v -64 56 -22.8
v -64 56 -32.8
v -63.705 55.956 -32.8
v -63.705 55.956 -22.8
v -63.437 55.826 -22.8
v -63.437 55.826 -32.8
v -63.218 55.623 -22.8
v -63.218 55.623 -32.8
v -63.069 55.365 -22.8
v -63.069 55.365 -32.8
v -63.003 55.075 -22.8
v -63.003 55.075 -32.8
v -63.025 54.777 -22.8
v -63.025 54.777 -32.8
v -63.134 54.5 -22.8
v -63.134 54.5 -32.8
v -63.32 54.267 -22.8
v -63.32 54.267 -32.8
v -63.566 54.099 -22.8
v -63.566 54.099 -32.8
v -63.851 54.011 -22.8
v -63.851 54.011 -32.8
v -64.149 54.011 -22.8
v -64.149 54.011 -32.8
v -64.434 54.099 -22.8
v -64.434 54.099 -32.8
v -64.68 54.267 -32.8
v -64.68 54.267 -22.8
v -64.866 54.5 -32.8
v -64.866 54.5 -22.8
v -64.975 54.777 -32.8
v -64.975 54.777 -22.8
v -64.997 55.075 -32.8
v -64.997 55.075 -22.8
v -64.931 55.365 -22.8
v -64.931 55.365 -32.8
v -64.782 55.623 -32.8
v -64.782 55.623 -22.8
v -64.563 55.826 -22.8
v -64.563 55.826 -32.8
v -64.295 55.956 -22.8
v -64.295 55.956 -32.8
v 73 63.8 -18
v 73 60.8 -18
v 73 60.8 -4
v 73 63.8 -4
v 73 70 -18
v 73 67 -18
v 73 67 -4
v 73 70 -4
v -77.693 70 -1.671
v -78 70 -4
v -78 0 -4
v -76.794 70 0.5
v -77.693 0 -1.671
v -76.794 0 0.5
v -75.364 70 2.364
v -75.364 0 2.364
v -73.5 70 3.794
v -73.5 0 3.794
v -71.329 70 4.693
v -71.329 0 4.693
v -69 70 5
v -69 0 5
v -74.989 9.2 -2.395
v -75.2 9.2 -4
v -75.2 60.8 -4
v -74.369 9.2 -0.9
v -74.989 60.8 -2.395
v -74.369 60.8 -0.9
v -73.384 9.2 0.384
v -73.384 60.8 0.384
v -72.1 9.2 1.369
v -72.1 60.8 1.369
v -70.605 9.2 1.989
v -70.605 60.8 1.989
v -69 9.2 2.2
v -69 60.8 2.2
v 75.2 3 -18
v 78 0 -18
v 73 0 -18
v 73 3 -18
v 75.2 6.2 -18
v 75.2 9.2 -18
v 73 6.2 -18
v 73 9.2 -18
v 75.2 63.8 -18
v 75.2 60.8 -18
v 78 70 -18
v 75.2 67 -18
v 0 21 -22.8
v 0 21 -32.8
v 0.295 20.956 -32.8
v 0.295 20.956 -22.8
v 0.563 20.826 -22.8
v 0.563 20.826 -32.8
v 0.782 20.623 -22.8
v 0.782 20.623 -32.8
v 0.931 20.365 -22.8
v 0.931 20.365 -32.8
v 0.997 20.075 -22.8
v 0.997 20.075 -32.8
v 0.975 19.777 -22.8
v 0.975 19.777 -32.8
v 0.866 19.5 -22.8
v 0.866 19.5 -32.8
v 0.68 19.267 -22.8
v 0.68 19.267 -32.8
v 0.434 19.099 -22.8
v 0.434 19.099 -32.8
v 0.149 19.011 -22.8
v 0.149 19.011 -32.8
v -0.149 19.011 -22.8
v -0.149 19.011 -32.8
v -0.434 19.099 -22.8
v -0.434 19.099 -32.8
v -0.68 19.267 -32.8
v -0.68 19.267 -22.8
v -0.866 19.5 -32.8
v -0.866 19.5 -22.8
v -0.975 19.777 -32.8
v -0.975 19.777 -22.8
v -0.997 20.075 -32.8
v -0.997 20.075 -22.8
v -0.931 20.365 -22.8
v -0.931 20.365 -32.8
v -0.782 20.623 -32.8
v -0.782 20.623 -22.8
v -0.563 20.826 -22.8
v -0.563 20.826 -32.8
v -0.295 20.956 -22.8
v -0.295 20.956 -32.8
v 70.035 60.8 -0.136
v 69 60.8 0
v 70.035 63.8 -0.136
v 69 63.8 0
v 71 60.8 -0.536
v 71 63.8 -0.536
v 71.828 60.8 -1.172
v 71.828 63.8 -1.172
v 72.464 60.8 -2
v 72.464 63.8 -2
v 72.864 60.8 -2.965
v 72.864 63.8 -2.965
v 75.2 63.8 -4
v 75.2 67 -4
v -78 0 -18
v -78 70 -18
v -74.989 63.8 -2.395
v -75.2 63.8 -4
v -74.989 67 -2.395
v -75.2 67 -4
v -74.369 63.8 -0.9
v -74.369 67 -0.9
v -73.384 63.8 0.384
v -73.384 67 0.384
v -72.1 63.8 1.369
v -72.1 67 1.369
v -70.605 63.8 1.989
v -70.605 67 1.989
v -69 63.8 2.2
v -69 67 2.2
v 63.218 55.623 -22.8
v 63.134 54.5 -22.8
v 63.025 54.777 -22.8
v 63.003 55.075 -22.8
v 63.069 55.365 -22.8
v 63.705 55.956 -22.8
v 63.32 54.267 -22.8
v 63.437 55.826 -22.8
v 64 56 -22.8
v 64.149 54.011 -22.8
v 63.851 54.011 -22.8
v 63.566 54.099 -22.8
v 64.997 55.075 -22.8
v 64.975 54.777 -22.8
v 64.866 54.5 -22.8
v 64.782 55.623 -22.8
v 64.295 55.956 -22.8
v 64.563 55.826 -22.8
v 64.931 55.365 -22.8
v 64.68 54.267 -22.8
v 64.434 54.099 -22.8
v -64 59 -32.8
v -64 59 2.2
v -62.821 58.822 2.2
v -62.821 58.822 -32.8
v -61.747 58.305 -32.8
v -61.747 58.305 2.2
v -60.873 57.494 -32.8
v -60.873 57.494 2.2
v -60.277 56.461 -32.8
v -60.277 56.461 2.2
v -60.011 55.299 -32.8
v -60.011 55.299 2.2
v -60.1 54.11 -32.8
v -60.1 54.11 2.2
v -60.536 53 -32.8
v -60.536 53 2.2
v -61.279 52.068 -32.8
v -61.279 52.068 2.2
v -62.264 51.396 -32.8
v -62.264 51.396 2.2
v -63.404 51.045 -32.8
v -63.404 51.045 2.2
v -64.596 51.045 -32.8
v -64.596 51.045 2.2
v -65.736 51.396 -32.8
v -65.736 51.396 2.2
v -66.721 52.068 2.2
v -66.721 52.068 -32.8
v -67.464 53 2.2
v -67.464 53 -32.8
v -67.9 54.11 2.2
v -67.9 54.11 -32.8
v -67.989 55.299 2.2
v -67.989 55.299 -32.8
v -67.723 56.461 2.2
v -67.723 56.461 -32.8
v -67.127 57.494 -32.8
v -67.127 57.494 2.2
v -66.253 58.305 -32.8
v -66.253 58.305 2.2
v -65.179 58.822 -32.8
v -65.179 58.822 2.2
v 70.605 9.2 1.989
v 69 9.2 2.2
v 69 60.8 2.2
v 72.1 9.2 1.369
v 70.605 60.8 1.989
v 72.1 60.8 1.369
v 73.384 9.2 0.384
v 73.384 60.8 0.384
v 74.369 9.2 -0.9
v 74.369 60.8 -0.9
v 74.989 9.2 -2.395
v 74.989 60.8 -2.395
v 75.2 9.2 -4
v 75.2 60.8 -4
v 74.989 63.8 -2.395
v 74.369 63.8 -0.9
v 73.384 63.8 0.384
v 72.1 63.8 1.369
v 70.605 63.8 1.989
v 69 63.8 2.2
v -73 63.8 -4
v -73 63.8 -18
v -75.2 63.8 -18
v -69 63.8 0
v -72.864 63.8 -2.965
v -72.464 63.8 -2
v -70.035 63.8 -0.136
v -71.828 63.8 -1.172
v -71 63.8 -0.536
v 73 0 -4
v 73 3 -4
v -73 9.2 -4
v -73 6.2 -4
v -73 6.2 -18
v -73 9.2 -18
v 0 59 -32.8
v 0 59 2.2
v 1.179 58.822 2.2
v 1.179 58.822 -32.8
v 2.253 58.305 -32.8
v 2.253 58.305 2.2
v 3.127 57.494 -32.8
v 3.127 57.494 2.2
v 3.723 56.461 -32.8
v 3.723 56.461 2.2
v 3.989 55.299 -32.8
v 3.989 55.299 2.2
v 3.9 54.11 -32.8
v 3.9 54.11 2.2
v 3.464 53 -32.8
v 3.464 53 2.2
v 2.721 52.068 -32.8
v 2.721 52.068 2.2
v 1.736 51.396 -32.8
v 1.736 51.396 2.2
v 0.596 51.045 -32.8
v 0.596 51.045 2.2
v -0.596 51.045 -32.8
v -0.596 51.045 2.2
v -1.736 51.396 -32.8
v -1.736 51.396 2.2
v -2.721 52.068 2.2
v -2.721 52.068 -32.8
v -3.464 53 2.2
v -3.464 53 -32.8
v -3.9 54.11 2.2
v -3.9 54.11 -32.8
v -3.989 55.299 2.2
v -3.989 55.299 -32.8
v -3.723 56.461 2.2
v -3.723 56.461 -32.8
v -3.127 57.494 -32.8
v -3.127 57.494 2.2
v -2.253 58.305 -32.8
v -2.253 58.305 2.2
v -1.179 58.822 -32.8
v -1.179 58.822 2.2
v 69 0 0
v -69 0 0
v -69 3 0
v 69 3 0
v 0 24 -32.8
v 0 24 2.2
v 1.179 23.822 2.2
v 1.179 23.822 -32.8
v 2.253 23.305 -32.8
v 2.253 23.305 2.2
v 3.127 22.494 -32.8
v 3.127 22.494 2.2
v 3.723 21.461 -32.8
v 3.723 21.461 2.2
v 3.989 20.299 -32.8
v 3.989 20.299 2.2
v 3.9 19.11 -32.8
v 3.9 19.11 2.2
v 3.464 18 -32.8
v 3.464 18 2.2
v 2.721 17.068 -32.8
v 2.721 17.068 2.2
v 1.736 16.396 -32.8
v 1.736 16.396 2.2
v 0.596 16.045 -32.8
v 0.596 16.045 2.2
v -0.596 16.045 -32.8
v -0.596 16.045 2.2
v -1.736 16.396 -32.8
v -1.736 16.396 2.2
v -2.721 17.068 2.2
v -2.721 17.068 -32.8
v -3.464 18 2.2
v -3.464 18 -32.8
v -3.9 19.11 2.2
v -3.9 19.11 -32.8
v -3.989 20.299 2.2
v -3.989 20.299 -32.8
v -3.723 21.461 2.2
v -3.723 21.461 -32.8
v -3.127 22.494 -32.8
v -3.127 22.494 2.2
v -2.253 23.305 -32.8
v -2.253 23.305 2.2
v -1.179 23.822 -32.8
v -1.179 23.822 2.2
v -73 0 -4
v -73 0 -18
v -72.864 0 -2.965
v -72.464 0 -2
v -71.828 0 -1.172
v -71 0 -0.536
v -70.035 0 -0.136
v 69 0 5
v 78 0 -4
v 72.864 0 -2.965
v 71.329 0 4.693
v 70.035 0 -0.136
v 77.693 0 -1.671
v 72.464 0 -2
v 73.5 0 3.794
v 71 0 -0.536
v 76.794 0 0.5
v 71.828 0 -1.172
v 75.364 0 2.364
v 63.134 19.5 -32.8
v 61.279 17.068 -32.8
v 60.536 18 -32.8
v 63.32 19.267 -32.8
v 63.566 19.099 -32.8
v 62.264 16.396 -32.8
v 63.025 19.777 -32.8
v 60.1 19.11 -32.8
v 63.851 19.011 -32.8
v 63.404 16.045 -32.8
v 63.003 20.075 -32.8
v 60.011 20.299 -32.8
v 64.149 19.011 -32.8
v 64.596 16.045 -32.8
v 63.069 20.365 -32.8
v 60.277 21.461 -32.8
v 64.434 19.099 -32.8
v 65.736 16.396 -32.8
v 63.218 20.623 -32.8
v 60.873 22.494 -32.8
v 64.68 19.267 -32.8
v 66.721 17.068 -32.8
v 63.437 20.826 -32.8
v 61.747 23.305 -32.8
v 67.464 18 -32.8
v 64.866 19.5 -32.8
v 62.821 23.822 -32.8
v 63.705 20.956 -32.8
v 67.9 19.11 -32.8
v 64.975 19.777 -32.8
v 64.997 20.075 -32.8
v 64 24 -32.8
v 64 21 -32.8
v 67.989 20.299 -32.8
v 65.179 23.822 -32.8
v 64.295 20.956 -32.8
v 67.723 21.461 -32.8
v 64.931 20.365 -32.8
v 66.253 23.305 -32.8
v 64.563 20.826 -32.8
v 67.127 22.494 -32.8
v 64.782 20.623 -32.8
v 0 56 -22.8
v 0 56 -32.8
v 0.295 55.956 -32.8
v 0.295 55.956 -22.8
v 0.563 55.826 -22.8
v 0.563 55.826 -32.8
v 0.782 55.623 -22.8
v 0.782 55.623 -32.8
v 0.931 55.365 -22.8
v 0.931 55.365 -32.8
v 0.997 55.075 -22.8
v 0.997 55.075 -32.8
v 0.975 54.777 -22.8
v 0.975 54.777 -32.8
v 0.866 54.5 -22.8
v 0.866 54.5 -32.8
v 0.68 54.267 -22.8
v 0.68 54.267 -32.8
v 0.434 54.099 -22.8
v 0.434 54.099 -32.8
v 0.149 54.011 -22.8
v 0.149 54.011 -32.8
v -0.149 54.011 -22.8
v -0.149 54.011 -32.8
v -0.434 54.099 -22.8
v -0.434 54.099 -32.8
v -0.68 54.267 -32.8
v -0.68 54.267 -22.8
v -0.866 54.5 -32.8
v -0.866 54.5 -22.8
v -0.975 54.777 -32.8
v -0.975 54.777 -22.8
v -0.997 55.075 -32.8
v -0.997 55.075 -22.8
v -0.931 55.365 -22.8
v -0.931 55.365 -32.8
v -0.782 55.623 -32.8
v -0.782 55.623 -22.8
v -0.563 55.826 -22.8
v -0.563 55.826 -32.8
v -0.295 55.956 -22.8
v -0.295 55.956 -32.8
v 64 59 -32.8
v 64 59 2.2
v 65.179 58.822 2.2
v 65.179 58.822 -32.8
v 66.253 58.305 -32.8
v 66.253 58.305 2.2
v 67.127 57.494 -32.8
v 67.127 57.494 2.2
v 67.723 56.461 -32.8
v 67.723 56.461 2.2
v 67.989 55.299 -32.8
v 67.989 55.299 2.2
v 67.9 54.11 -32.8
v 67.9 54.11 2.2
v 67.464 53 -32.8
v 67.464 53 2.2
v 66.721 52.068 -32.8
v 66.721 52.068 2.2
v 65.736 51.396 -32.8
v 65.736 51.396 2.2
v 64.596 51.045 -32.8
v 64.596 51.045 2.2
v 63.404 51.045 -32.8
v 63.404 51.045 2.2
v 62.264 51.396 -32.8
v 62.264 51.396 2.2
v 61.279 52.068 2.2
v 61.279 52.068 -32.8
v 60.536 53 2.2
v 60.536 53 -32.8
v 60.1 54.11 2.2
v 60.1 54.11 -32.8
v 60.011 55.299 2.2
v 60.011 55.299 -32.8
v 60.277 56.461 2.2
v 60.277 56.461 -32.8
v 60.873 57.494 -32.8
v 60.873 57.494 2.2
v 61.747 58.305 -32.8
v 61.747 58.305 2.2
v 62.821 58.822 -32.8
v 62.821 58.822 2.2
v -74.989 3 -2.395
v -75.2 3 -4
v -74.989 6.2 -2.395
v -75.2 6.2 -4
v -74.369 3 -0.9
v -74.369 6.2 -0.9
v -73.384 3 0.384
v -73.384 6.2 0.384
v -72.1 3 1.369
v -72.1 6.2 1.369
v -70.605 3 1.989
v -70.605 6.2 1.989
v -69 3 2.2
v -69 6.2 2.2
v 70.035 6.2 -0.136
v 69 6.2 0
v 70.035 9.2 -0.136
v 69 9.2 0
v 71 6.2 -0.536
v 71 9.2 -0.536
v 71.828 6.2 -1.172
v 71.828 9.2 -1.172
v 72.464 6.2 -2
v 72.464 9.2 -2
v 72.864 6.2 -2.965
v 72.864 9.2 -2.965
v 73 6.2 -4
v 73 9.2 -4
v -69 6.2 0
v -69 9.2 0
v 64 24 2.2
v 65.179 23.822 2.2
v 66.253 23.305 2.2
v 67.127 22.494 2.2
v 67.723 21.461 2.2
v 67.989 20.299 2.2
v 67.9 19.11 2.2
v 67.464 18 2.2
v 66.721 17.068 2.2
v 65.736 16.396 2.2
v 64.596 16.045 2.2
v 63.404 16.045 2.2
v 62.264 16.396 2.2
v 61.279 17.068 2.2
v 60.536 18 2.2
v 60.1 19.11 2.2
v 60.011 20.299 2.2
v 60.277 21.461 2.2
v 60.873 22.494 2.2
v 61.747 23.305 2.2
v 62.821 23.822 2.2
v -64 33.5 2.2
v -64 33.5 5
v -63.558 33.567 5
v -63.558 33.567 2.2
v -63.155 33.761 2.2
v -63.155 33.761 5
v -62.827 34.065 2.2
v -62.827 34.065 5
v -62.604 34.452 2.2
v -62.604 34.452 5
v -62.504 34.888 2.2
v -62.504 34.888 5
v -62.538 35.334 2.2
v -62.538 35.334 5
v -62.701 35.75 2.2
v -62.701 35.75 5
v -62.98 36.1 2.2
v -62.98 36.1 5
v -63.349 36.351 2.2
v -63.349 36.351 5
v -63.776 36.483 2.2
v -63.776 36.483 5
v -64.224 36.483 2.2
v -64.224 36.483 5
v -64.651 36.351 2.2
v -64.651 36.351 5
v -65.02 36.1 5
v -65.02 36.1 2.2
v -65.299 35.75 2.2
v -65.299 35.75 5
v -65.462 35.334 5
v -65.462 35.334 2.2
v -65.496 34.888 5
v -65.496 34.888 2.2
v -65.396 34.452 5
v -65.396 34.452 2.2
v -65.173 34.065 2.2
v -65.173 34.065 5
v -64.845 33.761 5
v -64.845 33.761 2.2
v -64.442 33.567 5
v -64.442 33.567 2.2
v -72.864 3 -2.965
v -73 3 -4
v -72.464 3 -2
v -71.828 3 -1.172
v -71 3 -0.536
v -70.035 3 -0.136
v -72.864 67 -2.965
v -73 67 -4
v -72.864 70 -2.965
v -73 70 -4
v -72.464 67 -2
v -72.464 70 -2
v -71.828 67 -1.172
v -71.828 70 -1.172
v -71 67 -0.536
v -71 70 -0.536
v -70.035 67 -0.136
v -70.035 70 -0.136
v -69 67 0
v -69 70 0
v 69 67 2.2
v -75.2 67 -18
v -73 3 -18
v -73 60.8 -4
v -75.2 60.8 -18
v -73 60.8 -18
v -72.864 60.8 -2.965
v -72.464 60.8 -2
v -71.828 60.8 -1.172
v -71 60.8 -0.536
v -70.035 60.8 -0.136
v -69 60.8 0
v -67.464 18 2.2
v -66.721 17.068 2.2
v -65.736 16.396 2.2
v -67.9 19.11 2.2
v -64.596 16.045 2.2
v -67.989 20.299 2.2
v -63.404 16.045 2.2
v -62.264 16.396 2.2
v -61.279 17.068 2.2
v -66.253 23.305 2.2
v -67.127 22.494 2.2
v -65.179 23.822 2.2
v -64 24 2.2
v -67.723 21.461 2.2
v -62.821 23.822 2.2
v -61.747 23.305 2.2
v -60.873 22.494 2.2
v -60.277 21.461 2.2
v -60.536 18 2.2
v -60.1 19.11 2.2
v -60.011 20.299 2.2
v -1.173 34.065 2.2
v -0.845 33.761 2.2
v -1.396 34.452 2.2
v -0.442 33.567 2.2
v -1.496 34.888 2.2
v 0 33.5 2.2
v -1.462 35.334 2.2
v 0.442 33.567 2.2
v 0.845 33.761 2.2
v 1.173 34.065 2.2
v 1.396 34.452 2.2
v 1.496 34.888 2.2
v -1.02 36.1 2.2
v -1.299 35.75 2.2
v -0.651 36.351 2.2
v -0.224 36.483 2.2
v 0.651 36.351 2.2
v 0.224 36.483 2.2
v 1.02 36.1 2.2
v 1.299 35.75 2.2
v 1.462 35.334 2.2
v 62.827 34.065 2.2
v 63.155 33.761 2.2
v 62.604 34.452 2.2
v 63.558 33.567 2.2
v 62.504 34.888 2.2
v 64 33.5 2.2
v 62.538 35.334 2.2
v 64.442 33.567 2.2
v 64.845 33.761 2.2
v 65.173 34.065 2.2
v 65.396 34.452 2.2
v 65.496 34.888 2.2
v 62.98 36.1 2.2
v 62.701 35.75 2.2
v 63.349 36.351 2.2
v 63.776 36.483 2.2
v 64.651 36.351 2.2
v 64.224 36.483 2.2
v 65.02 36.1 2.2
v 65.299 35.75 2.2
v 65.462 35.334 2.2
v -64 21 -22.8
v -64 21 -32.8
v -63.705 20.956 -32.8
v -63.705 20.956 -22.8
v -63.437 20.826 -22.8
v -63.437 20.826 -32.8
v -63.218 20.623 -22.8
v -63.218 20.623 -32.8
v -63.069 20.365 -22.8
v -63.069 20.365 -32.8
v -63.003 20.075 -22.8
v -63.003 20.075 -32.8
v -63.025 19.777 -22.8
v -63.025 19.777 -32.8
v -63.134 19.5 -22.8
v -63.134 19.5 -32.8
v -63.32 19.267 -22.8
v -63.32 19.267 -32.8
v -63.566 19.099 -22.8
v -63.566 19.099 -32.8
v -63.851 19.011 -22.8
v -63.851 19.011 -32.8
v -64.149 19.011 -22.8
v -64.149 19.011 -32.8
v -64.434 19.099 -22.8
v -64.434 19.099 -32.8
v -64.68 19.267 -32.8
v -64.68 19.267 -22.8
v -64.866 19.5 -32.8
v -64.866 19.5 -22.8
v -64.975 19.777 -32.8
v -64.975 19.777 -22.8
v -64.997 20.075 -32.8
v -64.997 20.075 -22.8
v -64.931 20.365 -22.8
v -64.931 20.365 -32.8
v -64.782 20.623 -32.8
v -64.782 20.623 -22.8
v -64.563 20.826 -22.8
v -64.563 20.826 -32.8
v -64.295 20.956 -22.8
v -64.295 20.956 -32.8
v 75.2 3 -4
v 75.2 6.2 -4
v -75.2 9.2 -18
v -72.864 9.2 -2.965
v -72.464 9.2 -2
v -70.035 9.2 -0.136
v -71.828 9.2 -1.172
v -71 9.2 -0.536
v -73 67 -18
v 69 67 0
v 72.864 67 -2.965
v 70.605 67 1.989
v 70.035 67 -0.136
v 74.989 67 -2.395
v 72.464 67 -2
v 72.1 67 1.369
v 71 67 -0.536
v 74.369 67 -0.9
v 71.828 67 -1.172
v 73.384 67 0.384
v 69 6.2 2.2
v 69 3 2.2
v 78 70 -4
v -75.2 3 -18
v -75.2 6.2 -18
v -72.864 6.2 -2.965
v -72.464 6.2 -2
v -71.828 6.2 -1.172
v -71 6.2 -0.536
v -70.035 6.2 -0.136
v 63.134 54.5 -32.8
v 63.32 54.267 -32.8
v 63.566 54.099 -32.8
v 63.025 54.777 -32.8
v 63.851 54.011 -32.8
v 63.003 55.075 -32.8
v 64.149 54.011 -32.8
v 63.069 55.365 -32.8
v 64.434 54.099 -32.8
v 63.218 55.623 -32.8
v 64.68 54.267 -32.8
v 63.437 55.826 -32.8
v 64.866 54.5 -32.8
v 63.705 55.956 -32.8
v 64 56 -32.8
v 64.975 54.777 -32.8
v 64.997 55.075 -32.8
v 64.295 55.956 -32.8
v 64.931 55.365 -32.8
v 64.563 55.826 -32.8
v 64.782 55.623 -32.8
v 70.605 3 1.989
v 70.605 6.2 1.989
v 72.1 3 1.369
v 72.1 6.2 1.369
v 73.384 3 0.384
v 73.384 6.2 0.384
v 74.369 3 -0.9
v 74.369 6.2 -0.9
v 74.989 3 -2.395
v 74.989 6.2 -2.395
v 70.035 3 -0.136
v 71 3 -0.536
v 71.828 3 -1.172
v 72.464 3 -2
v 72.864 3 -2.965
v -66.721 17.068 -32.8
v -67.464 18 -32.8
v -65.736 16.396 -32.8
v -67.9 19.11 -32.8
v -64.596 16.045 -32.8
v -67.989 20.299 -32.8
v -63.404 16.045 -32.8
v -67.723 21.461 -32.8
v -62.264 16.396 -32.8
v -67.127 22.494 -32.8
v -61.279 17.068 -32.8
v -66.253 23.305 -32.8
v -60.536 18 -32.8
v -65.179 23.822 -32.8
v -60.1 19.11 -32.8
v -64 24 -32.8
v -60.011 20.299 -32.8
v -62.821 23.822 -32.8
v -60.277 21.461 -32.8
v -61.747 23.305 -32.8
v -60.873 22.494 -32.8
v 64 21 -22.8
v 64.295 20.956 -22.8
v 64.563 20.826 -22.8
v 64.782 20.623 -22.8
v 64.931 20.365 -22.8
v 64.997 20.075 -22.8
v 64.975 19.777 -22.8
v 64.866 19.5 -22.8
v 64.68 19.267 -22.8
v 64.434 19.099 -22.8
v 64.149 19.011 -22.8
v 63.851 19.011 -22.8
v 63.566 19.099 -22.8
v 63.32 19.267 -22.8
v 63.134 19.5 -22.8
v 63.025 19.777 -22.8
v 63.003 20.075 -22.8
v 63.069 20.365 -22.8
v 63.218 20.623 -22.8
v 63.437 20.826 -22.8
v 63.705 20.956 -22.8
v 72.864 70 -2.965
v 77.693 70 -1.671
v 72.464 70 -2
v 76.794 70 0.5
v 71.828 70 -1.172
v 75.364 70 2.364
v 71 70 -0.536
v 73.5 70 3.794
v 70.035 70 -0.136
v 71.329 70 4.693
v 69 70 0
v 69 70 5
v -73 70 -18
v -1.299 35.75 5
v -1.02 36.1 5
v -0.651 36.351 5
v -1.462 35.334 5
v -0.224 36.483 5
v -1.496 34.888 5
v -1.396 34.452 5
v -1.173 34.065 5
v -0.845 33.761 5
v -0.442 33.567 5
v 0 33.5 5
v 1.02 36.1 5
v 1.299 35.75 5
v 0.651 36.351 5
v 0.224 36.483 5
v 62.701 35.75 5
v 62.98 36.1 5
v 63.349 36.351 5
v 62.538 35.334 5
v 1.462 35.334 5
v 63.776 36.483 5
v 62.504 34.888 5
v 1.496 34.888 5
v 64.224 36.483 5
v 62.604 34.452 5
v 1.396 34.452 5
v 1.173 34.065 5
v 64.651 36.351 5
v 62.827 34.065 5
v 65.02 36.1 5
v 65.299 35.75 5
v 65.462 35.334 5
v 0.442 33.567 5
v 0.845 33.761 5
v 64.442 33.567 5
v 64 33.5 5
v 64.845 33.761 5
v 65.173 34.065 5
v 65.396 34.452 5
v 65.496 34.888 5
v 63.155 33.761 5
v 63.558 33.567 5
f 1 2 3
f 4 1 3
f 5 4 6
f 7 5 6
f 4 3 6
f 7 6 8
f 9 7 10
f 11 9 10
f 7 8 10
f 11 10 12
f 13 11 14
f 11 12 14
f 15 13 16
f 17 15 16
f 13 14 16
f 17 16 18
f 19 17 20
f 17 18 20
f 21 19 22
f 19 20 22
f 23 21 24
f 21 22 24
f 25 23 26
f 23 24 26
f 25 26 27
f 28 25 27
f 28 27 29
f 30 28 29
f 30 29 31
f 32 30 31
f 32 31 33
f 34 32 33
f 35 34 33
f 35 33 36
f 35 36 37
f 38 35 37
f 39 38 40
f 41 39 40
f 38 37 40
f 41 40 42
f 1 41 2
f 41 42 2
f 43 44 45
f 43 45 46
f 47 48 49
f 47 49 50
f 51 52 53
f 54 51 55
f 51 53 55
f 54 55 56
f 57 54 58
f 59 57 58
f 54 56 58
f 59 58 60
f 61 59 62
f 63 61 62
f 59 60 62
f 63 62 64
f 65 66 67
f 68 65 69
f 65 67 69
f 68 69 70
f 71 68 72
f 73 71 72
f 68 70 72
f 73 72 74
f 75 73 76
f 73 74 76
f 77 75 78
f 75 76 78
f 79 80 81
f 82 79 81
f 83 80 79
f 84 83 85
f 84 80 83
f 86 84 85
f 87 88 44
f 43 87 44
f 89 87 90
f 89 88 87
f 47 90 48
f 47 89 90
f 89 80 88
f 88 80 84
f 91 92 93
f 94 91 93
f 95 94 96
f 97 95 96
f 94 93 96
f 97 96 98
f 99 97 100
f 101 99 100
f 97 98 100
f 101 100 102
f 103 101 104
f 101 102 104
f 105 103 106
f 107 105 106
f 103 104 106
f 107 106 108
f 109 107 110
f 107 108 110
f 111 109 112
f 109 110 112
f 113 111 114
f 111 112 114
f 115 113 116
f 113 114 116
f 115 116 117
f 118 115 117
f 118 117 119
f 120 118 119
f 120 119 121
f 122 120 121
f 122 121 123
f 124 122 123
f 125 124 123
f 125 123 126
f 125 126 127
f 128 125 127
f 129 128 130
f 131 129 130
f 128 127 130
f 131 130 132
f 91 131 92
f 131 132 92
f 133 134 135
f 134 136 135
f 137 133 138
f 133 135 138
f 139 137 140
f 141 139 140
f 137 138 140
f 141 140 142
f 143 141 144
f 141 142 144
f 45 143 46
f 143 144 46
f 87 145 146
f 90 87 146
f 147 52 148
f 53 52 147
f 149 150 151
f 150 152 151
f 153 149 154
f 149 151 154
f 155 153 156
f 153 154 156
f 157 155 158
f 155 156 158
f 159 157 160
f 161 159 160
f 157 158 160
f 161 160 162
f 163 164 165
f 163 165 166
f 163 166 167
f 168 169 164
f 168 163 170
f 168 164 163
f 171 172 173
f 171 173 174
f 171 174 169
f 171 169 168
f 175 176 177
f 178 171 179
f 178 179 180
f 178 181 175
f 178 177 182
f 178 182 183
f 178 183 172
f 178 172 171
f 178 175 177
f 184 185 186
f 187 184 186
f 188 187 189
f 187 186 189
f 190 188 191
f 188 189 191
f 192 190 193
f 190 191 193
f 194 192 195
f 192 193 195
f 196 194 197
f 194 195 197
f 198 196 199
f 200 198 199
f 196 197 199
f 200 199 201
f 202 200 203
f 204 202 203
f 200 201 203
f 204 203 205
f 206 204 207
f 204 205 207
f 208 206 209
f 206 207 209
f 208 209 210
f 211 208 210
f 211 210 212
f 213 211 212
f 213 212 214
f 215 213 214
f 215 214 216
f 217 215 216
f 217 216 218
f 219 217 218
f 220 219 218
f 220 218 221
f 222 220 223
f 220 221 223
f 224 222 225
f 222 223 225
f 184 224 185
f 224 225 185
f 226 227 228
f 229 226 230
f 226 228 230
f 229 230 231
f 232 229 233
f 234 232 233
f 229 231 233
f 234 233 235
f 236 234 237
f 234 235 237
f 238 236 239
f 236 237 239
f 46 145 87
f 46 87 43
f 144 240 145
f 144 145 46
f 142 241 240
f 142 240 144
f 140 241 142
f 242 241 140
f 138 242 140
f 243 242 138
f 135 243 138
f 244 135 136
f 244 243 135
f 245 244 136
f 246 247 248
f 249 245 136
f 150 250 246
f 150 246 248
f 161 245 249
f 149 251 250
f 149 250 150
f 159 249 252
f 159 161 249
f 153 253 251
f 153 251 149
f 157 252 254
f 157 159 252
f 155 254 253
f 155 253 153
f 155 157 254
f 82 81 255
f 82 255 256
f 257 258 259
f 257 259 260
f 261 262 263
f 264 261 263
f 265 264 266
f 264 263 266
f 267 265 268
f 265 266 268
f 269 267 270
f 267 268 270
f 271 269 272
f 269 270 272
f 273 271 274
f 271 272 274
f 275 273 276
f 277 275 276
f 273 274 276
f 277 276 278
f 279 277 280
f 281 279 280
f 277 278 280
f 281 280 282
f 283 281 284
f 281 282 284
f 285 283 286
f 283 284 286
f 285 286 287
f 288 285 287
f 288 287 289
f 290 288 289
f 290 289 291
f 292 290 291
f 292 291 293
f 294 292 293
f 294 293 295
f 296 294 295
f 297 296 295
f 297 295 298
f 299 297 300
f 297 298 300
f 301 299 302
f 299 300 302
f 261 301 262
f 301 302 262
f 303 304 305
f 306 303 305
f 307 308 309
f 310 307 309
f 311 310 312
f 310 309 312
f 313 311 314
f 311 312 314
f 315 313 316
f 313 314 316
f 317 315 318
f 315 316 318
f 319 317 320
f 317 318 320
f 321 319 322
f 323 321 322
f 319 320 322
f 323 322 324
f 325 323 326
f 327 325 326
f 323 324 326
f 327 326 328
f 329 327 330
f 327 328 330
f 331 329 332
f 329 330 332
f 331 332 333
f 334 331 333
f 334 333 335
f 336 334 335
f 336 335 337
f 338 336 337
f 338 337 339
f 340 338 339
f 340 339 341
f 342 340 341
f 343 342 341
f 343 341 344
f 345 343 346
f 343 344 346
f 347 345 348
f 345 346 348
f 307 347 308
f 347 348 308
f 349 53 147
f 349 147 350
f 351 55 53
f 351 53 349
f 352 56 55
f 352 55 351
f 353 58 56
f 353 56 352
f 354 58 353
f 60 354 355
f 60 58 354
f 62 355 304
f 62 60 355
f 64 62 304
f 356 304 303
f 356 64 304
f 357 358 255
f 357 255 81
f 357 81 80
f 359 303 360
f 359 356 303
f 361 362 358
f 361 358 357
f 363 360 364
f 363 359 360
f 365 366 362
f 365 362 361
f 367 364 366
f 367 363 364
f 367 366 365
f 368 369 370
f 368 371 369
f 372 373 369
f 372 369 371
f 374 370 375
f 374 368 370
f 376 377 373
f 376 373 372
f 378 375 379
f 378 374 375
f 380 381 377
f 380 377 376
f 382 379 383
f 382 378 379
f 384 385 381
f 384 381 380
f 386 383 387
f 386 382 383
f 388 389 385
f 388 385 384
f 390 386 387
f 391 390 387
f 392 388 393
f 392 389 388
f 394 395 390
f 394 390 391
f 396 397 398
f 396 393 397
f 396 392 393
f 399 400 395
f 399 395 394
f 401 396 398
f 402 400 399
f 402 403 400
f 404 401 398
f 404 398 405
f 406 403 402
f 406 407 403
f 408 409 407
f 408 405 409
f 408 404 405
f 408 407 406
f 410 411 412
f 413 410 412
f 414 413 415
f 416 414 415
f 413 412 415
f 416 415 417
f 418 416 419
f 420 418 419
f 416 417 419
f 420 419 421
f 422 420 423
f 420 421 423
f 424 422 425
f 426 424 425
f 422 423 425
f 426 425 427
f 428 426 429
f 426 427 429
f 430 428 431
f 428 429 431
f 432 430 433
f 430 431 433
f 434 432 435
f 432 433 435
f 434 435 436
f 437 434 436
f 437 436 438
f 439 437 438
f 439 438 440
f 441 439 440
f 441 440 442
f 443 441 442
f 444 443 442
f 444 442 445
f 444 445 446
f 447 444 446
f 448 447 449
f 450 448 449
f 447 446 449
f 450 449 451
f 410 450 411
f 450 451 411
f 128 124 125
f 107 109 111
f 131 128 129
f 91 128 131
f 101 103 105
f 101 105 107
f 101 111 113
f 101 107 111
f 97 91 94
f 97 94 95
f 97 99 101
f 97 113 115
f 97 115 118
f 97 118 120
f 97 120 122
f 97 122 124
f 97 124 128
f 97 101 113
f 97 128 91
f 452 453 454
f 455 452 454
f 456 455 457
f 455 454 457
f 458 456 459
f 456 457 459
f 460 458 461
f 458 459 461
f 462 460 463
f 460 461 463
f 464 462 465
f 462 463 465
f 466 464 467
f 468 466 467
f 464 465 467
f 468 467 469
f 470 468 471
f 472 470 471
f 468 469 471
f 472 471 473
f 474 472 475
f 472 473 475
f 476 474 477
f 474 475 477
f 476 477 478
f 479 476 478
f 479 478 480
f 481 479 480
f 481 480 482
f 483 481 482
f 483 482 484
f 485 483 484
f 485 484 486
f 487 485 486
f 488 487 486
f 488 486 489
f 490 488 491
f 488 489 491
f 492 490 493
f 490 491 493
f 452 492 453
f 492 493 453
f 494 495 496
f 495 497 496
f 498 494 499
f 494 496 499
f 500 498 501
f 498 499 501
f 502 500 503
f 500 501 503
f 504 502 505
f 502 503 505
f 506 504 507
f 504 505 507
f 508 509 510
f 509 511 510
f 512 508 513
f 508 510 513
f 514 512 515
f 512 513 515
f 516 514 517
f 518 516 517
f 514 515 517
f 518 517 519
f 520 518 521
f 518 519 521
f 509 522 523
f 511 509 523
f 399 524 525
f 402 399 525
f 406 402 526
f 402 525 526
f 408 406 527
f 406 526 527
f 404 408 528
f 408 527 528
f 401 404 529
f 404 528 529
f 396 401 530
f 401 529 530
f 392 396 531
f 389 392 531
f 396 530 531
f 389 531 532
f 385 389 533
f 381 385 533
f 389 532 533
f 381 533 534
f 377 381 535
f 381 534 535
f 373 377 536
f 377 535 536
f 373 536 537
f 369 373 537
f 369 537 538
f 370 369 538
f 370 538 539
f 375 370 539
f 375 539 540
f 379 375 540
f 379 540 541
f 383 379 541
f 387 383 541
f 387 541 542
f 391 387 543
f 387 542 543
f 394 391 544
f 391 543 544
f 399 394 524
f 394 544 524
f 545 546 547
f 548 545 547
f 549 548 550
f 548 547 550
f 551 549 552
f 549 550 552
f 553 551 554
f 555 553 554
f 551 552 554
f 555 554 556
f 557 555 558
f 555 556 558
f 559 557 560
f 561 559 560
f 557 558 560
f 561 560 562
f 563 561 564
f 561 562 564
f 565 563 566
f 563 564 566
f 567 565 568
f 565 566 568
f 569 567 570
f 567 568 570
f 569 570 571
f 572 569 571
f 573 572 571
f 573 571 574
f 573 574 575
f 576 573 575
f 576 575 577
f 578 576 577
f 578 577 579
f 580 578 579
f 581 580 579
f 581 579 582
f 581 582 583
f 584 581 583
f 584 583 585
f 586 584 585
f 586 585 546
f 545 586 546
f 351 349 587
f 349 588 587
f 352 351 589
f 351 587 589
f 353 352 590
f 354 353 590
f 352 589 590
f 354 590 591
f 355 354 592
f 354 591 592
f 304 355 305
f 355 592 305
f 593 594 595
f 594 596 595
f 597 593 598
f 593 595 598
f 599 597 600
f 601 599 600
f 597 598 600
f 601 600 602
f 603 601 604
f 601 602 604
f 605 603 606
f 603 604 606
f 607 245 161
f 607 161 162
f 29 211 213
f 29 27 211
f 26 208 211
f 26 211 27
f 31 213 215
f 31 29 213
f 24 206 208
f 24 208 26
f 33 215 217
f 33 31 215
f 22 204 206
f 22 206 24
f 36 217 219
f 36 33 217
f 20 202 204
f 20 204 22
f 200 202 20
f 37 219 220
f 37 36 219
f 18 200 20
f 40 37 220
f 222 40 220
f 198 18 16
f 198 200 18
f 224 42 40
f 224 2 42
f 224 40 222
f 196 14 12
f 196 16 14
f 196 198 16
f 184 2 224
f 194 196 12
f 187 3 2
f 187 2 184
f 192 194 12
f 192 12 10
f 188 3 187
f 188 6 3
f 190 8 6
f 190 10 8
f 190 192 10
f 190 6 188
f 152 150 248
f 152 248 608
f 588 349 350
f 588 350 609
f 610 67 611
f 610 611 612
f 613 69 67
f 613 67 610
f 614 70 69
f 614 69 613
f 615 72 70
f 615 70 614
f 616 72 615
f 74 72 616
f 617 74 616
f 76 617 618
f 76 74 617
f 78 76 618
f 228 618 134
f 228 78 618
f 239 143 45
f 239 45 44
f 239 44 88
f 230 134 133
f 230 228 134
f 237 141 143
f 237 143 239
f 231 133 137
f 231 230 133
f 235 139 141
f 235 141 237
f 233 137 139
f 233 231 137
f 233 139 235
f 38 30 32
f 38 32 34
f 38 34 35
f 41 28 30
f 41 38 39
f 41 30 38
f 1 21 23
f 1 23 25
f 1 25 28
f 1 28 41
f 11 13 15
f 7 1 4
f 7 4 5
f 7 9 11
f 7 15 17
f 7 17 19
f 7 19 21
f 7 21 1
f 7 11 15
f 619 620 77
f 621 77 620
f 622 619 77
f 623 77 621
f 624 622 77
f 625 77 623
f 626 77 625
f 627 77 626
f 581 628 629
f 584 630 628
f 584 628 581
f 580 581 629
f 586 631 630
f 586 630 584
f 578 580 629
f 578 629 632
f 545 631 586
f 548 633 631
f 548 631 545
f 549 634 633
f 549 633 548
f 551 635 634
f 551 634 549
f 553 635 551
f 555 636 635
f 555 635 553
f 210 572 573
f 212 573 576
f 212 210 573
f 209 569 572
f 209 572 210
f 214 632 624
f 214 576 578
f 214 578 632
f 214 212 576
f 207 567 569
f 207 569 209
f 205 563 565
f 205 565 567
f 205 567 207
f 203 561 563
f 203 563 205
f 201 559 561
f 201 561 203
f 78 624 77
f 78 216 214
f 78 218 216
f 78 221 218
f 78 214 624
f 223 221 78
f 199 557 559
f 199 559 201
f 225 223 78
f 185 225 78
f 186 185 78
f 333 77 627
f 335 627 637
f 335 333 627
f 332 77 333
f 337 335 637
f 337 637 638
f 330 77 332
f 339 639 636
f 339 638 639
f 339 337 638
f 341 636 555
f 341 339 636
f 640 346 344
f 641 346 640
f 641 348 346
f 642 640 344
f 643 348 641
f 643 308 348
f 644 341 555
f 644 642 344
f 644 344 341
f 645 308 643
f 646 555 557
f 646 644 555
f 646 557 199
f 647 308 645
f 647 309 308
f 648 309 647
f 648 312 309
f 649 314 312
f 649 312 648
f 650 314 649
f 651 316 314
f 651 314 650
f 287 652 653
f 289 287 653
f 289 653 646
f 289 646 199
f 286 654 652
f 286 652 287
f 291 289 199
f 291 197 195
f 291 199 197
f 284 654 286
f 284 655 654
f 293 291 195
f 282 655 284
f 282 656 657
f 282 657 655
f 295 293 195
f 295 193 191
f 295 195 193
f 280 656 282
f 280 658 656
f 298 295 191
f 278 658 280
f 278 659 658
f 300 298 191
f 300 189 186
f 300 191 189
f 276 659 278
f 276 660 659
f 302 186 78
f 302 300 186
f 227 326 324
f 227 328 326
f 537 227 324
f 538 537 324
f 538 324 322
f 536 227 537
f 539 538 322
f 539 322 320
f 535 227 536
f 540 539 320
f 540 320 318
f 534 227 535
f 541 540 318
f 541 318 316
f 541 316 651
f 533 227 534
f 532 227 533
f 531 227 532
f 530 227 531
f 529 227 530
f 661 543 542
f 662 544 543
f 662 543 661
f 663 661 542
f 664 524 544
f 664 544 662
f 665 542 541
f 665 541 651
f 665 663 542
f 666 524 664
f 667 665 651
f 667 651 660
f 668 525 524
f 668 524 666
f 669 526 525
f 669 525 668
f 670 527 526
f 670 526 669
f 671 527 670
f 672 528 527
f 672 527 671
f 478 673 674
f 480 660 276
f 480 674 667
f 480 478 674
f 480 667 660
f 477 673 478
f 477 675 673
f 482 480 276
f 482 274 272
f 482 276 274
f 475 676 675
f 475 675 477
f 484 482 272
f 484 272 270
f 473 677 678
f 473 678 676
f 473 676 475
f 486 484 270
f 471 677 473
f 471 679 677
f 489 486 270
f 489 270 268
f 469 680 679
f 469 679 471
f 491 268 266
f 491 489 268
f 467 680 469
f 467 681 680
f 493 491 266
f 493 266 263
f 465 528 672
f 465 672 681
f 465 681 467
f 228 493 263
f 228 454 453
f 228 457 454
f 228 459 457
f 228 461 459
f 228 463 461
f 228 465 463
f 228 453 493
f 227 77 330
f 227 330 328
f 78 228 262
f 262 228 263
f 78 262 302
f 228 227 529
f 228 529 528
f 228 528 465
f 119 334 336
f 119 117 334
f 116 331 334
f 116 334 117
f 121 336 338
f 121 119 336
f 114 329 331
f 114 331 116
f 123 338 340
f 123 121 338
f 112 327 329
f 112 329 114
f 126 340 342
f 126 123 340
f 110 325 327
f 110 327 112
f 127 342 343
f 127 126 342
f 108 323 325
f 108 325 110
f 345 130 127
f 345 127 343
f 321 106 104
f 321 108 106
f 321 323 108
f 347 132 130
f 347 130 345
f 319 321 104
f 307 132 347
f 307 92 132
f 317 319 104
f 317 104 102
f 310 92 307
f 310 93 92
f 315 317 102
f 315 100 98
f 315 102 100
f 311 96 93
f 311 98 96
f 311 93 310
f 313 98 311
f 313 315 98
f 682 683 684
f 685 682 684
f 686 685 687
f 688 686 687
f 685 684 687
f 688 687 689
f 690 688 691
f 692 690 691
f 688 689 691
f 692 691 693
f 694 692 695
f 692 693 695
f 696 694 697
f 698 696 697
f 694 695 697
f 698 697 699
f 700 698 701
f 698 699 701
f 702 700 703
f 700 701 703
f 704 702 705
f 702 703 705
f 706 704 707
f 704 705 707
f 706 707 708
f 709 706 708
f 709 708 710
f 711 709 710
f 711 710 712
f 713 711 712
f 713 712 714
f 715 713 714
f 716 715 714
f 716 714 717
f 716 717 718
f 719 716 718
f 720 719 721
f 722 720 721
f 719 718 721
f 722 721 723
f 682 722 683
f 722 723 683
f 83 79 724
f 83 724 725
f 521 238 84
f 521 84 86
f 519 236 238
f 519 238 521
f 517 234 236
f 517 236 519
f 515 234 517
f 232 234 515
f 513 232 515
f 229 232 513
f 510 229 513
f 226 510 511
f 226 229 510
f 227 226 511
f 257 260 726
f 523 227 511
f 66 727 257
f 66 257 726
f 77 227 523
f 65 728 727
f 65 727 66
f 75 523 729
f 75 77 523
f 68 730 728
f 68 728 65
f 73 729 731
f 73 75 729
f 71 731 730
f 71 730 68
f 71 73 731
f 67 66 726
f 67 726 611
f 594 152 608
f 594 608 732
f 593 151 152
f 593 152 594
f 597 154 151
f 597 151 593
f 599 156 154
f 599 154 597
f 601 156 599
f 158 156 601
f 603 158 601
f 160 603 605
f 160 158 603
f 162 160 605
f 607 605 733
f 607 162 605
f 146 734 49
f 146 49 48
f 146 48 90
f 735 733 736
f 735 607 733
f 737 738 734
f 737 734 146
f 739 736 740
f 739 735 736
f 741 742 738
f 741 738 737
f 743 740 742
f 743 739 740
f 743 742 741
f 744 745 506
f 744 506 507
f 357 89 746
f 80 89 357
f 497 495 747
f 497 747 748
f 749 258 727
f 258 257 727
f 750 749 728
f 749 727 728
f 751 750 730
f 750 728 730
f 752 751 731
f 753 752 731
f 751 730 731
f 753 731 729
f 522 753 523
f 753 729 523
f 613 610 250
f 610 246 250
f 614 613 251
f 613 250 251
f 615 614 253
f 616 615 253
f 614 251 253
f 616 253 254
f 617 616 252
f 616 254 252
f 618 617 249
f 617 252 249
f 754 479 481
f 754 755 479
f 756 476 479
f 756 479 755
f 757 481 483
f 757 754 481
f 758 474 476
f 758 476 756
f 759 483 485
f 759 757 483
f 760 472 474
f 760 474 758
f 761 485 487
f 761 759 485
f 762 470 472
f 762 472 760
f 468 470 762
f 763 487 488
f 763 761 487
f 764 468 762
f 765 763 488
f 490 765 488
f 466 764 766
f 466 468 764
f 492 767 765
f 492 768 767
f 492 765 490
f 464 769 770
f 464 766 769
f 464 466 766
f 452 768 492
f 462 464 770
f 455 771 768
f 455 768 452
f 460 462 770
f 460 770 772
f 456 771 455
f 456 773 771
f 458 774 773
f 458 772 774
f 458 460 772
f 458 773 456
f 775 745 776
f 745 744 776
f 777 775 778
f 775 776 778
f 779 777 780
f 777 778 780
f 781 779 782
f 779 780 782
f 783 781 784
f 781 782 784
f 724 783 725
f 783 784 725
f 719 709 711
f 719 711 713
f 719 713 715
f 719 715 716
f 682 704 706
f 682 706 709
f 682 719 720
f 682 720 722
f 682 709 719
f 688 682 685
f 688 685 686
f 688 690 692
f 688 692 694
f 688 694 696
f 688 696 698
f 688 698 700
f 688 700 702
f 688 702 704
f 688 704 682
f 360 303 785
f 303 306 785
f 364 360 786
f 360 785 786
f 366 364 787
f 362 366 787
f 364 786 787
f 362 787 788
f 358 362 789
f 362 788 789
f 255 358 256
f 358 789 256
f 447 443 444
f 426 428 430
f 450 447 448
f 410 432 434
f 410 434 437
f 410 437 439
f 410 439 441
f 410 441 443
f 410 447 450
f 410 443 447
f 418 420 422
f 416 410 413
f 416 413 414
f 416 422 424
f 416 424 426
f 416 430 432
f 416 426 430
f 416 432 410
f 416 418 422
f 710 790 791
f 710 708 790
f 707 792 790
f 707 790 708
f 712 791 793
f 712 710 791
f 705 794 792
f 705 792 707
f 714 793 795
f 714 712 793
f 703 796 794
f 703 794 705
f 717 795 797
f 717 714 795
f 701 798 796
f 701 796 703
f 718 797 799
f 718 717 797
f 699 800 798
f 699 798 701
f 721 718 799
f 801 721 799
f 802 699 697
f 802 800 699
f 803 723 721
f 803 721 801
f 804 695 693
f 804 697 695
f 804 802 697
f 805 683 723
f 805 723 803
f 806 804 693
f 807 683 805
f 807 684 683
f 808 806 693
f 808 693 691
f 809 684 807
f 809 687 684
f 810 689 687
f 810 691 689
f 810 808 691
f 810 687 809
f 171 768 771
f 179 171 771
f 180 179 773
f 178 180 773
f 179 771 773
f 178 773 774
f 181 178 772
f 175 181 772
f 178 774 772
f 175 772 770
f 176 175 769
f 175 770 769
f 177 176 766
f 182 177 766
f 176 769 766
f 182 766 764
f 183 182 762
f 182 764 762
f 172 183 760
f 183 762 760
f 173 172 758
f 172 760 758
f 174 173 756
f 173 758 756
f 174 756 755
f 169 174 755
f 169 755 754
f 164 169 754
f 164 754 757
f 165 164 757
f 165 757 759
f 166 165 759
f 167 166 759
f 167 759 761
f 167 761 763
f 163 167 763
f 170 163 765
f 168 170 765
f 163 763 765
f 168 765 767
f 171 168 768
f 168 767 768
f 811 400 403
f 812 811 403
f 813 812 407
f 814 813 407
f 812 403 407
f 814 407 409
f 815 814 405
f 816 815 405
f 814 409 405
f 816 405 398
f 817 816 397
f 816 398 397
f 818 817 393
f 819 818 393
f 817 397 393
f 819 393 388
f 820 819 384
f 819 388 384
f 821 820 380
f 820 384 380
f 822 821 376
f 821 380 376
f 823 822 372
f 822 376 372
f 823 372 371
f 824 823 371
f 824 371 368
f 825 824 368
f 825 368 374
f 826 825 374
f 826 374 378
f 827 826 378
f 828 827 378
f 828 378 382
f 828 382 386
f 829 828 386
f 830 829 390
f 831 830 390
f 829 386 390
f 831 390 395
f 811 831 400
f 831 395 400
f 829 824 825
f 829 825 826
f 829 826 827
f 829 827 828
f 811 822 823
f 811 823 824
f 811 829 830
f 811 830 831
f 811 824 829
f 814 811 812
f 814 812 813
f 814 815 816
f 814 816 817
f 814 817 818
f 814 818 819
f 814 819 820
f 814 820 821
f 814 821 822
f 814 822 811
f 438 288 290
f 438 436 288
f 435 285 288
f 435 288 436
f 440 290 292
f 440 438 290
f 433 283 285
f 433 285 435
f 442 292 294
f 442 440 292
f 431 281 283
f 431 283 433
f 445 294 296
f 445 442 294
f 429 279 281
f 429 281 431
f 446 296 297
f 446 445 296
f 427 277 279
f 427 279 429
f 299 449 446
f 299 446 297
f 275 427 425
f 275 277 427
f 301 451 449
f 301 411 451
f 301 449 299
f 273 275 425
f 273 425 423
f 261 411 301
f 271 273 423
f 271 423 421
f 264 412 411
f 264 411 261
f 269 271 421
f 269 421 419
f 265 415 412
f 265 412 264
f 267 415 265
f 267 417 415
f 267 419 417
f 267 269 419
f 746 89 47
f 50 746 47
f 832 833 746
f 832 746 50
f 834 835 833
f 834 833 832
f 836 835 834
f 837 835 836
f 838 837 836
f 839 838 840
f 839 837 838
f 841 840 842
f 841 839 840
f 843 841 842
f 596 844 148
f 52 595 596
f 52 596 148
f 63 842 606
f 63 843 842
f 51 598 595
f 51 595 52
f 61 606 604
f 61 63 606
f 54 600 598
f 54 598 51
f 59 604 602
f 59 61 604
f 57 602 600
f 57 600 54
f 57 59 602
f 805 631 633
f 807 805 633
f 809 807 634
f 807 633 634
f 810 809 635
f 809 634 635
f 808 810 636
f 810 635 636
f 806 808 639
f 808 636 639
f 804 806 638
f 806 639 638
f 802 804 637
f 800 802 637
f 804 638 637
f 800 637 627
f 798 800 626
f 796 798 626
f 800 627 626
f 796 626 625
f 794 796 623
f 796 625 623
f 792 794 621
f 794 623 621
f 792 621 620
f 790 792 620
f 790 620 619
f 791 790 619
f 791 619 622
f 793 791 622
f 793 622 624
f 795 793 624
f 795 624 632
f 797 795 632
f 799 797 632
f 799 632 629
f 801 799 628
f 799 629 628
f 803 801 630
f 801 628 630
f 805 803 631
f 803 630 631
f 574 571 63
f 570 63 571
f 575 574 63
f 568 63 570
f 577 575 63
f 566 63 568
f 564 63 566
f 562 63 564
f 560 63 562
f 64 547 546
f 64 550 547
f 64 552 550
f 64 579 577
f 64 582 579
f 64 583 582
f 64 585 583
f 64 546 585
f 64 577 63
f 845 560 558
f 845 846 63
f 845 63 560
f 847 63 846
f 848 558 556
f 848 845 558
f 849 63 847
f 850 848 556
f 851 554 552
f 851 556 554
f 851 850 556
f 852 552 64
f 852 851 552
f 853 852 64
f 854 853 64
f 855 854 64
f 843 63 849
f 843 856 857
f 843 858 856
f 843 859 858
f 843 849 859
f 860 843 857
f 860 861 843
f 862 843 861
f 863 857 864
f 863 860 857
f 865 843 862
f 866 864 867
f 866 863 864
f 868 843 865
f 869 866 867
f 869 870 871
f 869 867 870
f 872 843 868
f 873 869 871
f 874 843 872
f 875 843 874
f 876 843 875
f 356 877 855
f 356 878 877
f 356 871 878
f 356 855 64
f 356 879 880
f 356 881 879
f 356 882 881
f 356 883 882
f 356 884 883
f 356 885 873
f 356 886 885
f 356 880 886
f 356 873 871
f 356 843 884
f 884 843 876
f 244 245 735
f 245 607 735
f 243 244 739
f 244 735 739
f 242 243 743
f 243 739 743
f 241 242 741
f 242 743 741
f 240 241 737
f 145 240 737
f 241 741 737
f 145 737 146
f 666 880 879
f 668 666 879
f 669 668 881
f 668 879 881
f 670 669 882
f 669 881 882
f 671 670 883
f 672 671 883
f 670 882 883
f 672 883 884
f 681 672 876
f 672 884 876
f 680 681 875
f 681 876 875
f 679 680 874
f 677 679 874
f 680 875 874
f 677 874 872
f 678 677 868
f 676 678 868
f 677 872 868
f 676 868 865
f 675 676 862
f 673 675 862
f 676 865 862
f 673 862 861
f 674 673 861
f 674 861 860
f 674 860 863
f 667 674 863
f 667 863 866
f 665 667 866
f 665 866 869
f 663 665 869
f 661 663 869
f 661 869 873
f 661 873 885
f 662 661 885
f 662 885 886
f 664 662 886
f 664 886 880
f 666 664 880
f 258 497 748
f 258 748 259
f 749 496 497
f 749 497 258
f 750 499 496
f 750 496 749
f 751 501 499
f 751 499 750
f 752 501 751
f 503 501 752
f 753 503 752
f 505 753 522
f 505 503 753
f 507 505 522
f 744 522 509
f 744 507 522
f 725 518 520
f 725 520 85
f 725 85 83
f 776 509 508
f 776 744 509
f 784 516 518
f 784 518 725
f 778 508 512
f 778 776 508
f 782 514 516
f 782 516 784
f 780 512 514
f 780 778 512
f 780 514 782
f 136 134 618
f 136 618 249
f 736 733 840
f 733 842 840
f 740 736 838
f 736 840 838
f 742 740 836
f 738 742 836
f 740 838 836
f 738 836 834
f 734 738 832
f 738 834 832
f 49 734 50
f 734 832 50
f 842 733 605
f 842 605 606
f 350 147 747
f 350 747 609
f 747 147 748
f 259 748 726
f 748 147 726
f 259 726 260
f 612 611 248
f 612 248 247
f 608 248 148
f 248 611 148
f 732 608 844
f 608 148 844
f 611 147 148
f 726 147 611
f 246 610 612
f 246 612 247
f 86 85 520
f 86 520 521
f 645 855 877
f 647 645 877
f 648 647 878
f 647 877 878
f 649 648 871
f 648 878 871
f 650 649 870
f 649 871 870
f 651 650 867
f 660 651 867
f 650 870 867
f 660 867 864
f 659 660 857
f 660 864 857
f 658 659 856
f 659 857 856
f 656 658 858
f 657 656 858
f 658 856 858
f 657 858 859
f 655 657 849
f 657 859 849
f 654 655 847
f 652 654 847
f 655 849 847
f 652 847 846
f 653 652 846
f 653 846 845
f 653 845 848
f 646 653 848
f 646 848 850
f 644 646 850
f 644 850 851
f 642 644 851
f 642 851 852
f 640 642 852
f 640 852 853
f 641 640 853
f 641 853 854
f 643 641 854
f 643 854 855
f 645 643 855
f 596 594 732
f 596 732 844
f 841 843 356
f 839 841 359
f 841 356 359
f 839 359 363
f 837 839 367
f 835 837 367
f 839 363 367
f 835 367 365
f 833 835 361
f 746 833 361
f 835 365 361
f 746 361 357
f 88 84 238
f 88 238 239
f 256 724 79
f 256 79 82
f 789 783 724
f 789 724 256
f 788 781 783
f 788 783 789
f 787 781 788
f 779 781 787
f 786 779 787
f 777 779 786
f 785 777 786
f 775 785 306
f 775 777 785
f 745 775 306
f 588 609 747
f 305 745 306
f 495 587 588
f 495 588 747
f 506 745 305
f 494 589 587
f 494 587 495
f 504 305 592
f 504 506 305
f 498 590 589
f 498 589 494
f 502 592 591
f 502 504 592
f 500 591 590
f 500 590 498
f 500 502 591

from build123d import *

# Parameters (mm, degrees)
SKETCH002_R     = 1.5
POCKET_DEPTH    = 23.001
SKETCH003_R     = 4
PAD_DEPTH       = 35
SKETCH004_R     = 1
POCKET001_DEPTH = 10


with BuildPart() as part:
    # AdditivePipe: sweep along a path in Sketch001
    with BuildLine(Plane.XZ) as additivepipe_path:
        Line((-73, -18), (-73, -4))
        ThreePointArc((-73, -4), (-71.828427, -1.171573), (-69, 0))
        Line((-69, 0), (0, 0))
        Line((0, 0), (69, 0))
        ThreePointArc((69, 0), (71.828427, -1.171573), (73, -4))
        Line((73, -4), (73, -18))
    # Sketch → AdditivePipe (sweep)
    with BuildSketch(Plane.YZ):
        Polygon((0, 5), (70, 5), (70, 0), (67, 0), (67, 2.2), (63.8, 2.2), (63.8, 0), (60.8, 0), (60.8, 2.2), (9.2, 2.2), (9.2, 0), (6.2, 0), (6.2, 2.2), (3, 2.2), (3, 0), (0, 0), align=None)
    sweep(path=additivepipe_path.line)

    # Sketch002 (on Face35 of AdditivePipe) → Pocket (cut, through all)
    with BuildSketch(Plane(origin=(0, 0, 5), x_dir=(0, -1, 0), z_dir=(0, 0, 1))):
        with Locations((-35, -64)):
            Circle(SKETCH002_R)
        with Locations((-35, 64)):
            Circle(SKETCH002_R)
        with Locations((-35, 0)):
            Circle(SKETCH002_R)
    extrude(amount=-POCKET_DEPTH, mode=Mode.SUBTRACT)

    # Sketch003 (on Face43 of Pocket) → Pad (join)
    with BuildSketch(Plane.YX.offset(-2.2)):
        with Locations((20, 64)):
            Circle(SKETCH003_R)
        with Locations((55, 64)):
            Circle(SKETCH003_R)
        with Locations((20, 0)):
            Circle(SKETCH003_R)
        with Locations((55, 0)):
            Circle(SKETCH003_R)
        with Locations((20, -64)):
            Circle(SKETCH003_R)
        with Locations((55, -64)):
            Circle(SKETCH003_R)
    extrude(amount=PAD_DEPTH)

    # Sketch004 (on Face88 of Pad) → Pocket001 (cut)
    with BuildSketch(Plane.YX.offset(32.8)):
        with Locations((20, 64)):
            Circle(SKETCH004_R)
        with Locations((55, 64)):
            Circle(SKETCH004_R)
        with Locations((20, 0)):
            Circle(SKETCH004_R)
        with Locations((55, 0)):
            Circle(SKETCH004_R)
        with Locations((20, -64)):
            Circle(SKETCH004_R)
        with Locations((55, -64)):
            Circle(SKETCH004_R)
    extrude(amount=-POCKET001_DEPTH, mode=Mode.SUBTRACT)


solid = part.part
